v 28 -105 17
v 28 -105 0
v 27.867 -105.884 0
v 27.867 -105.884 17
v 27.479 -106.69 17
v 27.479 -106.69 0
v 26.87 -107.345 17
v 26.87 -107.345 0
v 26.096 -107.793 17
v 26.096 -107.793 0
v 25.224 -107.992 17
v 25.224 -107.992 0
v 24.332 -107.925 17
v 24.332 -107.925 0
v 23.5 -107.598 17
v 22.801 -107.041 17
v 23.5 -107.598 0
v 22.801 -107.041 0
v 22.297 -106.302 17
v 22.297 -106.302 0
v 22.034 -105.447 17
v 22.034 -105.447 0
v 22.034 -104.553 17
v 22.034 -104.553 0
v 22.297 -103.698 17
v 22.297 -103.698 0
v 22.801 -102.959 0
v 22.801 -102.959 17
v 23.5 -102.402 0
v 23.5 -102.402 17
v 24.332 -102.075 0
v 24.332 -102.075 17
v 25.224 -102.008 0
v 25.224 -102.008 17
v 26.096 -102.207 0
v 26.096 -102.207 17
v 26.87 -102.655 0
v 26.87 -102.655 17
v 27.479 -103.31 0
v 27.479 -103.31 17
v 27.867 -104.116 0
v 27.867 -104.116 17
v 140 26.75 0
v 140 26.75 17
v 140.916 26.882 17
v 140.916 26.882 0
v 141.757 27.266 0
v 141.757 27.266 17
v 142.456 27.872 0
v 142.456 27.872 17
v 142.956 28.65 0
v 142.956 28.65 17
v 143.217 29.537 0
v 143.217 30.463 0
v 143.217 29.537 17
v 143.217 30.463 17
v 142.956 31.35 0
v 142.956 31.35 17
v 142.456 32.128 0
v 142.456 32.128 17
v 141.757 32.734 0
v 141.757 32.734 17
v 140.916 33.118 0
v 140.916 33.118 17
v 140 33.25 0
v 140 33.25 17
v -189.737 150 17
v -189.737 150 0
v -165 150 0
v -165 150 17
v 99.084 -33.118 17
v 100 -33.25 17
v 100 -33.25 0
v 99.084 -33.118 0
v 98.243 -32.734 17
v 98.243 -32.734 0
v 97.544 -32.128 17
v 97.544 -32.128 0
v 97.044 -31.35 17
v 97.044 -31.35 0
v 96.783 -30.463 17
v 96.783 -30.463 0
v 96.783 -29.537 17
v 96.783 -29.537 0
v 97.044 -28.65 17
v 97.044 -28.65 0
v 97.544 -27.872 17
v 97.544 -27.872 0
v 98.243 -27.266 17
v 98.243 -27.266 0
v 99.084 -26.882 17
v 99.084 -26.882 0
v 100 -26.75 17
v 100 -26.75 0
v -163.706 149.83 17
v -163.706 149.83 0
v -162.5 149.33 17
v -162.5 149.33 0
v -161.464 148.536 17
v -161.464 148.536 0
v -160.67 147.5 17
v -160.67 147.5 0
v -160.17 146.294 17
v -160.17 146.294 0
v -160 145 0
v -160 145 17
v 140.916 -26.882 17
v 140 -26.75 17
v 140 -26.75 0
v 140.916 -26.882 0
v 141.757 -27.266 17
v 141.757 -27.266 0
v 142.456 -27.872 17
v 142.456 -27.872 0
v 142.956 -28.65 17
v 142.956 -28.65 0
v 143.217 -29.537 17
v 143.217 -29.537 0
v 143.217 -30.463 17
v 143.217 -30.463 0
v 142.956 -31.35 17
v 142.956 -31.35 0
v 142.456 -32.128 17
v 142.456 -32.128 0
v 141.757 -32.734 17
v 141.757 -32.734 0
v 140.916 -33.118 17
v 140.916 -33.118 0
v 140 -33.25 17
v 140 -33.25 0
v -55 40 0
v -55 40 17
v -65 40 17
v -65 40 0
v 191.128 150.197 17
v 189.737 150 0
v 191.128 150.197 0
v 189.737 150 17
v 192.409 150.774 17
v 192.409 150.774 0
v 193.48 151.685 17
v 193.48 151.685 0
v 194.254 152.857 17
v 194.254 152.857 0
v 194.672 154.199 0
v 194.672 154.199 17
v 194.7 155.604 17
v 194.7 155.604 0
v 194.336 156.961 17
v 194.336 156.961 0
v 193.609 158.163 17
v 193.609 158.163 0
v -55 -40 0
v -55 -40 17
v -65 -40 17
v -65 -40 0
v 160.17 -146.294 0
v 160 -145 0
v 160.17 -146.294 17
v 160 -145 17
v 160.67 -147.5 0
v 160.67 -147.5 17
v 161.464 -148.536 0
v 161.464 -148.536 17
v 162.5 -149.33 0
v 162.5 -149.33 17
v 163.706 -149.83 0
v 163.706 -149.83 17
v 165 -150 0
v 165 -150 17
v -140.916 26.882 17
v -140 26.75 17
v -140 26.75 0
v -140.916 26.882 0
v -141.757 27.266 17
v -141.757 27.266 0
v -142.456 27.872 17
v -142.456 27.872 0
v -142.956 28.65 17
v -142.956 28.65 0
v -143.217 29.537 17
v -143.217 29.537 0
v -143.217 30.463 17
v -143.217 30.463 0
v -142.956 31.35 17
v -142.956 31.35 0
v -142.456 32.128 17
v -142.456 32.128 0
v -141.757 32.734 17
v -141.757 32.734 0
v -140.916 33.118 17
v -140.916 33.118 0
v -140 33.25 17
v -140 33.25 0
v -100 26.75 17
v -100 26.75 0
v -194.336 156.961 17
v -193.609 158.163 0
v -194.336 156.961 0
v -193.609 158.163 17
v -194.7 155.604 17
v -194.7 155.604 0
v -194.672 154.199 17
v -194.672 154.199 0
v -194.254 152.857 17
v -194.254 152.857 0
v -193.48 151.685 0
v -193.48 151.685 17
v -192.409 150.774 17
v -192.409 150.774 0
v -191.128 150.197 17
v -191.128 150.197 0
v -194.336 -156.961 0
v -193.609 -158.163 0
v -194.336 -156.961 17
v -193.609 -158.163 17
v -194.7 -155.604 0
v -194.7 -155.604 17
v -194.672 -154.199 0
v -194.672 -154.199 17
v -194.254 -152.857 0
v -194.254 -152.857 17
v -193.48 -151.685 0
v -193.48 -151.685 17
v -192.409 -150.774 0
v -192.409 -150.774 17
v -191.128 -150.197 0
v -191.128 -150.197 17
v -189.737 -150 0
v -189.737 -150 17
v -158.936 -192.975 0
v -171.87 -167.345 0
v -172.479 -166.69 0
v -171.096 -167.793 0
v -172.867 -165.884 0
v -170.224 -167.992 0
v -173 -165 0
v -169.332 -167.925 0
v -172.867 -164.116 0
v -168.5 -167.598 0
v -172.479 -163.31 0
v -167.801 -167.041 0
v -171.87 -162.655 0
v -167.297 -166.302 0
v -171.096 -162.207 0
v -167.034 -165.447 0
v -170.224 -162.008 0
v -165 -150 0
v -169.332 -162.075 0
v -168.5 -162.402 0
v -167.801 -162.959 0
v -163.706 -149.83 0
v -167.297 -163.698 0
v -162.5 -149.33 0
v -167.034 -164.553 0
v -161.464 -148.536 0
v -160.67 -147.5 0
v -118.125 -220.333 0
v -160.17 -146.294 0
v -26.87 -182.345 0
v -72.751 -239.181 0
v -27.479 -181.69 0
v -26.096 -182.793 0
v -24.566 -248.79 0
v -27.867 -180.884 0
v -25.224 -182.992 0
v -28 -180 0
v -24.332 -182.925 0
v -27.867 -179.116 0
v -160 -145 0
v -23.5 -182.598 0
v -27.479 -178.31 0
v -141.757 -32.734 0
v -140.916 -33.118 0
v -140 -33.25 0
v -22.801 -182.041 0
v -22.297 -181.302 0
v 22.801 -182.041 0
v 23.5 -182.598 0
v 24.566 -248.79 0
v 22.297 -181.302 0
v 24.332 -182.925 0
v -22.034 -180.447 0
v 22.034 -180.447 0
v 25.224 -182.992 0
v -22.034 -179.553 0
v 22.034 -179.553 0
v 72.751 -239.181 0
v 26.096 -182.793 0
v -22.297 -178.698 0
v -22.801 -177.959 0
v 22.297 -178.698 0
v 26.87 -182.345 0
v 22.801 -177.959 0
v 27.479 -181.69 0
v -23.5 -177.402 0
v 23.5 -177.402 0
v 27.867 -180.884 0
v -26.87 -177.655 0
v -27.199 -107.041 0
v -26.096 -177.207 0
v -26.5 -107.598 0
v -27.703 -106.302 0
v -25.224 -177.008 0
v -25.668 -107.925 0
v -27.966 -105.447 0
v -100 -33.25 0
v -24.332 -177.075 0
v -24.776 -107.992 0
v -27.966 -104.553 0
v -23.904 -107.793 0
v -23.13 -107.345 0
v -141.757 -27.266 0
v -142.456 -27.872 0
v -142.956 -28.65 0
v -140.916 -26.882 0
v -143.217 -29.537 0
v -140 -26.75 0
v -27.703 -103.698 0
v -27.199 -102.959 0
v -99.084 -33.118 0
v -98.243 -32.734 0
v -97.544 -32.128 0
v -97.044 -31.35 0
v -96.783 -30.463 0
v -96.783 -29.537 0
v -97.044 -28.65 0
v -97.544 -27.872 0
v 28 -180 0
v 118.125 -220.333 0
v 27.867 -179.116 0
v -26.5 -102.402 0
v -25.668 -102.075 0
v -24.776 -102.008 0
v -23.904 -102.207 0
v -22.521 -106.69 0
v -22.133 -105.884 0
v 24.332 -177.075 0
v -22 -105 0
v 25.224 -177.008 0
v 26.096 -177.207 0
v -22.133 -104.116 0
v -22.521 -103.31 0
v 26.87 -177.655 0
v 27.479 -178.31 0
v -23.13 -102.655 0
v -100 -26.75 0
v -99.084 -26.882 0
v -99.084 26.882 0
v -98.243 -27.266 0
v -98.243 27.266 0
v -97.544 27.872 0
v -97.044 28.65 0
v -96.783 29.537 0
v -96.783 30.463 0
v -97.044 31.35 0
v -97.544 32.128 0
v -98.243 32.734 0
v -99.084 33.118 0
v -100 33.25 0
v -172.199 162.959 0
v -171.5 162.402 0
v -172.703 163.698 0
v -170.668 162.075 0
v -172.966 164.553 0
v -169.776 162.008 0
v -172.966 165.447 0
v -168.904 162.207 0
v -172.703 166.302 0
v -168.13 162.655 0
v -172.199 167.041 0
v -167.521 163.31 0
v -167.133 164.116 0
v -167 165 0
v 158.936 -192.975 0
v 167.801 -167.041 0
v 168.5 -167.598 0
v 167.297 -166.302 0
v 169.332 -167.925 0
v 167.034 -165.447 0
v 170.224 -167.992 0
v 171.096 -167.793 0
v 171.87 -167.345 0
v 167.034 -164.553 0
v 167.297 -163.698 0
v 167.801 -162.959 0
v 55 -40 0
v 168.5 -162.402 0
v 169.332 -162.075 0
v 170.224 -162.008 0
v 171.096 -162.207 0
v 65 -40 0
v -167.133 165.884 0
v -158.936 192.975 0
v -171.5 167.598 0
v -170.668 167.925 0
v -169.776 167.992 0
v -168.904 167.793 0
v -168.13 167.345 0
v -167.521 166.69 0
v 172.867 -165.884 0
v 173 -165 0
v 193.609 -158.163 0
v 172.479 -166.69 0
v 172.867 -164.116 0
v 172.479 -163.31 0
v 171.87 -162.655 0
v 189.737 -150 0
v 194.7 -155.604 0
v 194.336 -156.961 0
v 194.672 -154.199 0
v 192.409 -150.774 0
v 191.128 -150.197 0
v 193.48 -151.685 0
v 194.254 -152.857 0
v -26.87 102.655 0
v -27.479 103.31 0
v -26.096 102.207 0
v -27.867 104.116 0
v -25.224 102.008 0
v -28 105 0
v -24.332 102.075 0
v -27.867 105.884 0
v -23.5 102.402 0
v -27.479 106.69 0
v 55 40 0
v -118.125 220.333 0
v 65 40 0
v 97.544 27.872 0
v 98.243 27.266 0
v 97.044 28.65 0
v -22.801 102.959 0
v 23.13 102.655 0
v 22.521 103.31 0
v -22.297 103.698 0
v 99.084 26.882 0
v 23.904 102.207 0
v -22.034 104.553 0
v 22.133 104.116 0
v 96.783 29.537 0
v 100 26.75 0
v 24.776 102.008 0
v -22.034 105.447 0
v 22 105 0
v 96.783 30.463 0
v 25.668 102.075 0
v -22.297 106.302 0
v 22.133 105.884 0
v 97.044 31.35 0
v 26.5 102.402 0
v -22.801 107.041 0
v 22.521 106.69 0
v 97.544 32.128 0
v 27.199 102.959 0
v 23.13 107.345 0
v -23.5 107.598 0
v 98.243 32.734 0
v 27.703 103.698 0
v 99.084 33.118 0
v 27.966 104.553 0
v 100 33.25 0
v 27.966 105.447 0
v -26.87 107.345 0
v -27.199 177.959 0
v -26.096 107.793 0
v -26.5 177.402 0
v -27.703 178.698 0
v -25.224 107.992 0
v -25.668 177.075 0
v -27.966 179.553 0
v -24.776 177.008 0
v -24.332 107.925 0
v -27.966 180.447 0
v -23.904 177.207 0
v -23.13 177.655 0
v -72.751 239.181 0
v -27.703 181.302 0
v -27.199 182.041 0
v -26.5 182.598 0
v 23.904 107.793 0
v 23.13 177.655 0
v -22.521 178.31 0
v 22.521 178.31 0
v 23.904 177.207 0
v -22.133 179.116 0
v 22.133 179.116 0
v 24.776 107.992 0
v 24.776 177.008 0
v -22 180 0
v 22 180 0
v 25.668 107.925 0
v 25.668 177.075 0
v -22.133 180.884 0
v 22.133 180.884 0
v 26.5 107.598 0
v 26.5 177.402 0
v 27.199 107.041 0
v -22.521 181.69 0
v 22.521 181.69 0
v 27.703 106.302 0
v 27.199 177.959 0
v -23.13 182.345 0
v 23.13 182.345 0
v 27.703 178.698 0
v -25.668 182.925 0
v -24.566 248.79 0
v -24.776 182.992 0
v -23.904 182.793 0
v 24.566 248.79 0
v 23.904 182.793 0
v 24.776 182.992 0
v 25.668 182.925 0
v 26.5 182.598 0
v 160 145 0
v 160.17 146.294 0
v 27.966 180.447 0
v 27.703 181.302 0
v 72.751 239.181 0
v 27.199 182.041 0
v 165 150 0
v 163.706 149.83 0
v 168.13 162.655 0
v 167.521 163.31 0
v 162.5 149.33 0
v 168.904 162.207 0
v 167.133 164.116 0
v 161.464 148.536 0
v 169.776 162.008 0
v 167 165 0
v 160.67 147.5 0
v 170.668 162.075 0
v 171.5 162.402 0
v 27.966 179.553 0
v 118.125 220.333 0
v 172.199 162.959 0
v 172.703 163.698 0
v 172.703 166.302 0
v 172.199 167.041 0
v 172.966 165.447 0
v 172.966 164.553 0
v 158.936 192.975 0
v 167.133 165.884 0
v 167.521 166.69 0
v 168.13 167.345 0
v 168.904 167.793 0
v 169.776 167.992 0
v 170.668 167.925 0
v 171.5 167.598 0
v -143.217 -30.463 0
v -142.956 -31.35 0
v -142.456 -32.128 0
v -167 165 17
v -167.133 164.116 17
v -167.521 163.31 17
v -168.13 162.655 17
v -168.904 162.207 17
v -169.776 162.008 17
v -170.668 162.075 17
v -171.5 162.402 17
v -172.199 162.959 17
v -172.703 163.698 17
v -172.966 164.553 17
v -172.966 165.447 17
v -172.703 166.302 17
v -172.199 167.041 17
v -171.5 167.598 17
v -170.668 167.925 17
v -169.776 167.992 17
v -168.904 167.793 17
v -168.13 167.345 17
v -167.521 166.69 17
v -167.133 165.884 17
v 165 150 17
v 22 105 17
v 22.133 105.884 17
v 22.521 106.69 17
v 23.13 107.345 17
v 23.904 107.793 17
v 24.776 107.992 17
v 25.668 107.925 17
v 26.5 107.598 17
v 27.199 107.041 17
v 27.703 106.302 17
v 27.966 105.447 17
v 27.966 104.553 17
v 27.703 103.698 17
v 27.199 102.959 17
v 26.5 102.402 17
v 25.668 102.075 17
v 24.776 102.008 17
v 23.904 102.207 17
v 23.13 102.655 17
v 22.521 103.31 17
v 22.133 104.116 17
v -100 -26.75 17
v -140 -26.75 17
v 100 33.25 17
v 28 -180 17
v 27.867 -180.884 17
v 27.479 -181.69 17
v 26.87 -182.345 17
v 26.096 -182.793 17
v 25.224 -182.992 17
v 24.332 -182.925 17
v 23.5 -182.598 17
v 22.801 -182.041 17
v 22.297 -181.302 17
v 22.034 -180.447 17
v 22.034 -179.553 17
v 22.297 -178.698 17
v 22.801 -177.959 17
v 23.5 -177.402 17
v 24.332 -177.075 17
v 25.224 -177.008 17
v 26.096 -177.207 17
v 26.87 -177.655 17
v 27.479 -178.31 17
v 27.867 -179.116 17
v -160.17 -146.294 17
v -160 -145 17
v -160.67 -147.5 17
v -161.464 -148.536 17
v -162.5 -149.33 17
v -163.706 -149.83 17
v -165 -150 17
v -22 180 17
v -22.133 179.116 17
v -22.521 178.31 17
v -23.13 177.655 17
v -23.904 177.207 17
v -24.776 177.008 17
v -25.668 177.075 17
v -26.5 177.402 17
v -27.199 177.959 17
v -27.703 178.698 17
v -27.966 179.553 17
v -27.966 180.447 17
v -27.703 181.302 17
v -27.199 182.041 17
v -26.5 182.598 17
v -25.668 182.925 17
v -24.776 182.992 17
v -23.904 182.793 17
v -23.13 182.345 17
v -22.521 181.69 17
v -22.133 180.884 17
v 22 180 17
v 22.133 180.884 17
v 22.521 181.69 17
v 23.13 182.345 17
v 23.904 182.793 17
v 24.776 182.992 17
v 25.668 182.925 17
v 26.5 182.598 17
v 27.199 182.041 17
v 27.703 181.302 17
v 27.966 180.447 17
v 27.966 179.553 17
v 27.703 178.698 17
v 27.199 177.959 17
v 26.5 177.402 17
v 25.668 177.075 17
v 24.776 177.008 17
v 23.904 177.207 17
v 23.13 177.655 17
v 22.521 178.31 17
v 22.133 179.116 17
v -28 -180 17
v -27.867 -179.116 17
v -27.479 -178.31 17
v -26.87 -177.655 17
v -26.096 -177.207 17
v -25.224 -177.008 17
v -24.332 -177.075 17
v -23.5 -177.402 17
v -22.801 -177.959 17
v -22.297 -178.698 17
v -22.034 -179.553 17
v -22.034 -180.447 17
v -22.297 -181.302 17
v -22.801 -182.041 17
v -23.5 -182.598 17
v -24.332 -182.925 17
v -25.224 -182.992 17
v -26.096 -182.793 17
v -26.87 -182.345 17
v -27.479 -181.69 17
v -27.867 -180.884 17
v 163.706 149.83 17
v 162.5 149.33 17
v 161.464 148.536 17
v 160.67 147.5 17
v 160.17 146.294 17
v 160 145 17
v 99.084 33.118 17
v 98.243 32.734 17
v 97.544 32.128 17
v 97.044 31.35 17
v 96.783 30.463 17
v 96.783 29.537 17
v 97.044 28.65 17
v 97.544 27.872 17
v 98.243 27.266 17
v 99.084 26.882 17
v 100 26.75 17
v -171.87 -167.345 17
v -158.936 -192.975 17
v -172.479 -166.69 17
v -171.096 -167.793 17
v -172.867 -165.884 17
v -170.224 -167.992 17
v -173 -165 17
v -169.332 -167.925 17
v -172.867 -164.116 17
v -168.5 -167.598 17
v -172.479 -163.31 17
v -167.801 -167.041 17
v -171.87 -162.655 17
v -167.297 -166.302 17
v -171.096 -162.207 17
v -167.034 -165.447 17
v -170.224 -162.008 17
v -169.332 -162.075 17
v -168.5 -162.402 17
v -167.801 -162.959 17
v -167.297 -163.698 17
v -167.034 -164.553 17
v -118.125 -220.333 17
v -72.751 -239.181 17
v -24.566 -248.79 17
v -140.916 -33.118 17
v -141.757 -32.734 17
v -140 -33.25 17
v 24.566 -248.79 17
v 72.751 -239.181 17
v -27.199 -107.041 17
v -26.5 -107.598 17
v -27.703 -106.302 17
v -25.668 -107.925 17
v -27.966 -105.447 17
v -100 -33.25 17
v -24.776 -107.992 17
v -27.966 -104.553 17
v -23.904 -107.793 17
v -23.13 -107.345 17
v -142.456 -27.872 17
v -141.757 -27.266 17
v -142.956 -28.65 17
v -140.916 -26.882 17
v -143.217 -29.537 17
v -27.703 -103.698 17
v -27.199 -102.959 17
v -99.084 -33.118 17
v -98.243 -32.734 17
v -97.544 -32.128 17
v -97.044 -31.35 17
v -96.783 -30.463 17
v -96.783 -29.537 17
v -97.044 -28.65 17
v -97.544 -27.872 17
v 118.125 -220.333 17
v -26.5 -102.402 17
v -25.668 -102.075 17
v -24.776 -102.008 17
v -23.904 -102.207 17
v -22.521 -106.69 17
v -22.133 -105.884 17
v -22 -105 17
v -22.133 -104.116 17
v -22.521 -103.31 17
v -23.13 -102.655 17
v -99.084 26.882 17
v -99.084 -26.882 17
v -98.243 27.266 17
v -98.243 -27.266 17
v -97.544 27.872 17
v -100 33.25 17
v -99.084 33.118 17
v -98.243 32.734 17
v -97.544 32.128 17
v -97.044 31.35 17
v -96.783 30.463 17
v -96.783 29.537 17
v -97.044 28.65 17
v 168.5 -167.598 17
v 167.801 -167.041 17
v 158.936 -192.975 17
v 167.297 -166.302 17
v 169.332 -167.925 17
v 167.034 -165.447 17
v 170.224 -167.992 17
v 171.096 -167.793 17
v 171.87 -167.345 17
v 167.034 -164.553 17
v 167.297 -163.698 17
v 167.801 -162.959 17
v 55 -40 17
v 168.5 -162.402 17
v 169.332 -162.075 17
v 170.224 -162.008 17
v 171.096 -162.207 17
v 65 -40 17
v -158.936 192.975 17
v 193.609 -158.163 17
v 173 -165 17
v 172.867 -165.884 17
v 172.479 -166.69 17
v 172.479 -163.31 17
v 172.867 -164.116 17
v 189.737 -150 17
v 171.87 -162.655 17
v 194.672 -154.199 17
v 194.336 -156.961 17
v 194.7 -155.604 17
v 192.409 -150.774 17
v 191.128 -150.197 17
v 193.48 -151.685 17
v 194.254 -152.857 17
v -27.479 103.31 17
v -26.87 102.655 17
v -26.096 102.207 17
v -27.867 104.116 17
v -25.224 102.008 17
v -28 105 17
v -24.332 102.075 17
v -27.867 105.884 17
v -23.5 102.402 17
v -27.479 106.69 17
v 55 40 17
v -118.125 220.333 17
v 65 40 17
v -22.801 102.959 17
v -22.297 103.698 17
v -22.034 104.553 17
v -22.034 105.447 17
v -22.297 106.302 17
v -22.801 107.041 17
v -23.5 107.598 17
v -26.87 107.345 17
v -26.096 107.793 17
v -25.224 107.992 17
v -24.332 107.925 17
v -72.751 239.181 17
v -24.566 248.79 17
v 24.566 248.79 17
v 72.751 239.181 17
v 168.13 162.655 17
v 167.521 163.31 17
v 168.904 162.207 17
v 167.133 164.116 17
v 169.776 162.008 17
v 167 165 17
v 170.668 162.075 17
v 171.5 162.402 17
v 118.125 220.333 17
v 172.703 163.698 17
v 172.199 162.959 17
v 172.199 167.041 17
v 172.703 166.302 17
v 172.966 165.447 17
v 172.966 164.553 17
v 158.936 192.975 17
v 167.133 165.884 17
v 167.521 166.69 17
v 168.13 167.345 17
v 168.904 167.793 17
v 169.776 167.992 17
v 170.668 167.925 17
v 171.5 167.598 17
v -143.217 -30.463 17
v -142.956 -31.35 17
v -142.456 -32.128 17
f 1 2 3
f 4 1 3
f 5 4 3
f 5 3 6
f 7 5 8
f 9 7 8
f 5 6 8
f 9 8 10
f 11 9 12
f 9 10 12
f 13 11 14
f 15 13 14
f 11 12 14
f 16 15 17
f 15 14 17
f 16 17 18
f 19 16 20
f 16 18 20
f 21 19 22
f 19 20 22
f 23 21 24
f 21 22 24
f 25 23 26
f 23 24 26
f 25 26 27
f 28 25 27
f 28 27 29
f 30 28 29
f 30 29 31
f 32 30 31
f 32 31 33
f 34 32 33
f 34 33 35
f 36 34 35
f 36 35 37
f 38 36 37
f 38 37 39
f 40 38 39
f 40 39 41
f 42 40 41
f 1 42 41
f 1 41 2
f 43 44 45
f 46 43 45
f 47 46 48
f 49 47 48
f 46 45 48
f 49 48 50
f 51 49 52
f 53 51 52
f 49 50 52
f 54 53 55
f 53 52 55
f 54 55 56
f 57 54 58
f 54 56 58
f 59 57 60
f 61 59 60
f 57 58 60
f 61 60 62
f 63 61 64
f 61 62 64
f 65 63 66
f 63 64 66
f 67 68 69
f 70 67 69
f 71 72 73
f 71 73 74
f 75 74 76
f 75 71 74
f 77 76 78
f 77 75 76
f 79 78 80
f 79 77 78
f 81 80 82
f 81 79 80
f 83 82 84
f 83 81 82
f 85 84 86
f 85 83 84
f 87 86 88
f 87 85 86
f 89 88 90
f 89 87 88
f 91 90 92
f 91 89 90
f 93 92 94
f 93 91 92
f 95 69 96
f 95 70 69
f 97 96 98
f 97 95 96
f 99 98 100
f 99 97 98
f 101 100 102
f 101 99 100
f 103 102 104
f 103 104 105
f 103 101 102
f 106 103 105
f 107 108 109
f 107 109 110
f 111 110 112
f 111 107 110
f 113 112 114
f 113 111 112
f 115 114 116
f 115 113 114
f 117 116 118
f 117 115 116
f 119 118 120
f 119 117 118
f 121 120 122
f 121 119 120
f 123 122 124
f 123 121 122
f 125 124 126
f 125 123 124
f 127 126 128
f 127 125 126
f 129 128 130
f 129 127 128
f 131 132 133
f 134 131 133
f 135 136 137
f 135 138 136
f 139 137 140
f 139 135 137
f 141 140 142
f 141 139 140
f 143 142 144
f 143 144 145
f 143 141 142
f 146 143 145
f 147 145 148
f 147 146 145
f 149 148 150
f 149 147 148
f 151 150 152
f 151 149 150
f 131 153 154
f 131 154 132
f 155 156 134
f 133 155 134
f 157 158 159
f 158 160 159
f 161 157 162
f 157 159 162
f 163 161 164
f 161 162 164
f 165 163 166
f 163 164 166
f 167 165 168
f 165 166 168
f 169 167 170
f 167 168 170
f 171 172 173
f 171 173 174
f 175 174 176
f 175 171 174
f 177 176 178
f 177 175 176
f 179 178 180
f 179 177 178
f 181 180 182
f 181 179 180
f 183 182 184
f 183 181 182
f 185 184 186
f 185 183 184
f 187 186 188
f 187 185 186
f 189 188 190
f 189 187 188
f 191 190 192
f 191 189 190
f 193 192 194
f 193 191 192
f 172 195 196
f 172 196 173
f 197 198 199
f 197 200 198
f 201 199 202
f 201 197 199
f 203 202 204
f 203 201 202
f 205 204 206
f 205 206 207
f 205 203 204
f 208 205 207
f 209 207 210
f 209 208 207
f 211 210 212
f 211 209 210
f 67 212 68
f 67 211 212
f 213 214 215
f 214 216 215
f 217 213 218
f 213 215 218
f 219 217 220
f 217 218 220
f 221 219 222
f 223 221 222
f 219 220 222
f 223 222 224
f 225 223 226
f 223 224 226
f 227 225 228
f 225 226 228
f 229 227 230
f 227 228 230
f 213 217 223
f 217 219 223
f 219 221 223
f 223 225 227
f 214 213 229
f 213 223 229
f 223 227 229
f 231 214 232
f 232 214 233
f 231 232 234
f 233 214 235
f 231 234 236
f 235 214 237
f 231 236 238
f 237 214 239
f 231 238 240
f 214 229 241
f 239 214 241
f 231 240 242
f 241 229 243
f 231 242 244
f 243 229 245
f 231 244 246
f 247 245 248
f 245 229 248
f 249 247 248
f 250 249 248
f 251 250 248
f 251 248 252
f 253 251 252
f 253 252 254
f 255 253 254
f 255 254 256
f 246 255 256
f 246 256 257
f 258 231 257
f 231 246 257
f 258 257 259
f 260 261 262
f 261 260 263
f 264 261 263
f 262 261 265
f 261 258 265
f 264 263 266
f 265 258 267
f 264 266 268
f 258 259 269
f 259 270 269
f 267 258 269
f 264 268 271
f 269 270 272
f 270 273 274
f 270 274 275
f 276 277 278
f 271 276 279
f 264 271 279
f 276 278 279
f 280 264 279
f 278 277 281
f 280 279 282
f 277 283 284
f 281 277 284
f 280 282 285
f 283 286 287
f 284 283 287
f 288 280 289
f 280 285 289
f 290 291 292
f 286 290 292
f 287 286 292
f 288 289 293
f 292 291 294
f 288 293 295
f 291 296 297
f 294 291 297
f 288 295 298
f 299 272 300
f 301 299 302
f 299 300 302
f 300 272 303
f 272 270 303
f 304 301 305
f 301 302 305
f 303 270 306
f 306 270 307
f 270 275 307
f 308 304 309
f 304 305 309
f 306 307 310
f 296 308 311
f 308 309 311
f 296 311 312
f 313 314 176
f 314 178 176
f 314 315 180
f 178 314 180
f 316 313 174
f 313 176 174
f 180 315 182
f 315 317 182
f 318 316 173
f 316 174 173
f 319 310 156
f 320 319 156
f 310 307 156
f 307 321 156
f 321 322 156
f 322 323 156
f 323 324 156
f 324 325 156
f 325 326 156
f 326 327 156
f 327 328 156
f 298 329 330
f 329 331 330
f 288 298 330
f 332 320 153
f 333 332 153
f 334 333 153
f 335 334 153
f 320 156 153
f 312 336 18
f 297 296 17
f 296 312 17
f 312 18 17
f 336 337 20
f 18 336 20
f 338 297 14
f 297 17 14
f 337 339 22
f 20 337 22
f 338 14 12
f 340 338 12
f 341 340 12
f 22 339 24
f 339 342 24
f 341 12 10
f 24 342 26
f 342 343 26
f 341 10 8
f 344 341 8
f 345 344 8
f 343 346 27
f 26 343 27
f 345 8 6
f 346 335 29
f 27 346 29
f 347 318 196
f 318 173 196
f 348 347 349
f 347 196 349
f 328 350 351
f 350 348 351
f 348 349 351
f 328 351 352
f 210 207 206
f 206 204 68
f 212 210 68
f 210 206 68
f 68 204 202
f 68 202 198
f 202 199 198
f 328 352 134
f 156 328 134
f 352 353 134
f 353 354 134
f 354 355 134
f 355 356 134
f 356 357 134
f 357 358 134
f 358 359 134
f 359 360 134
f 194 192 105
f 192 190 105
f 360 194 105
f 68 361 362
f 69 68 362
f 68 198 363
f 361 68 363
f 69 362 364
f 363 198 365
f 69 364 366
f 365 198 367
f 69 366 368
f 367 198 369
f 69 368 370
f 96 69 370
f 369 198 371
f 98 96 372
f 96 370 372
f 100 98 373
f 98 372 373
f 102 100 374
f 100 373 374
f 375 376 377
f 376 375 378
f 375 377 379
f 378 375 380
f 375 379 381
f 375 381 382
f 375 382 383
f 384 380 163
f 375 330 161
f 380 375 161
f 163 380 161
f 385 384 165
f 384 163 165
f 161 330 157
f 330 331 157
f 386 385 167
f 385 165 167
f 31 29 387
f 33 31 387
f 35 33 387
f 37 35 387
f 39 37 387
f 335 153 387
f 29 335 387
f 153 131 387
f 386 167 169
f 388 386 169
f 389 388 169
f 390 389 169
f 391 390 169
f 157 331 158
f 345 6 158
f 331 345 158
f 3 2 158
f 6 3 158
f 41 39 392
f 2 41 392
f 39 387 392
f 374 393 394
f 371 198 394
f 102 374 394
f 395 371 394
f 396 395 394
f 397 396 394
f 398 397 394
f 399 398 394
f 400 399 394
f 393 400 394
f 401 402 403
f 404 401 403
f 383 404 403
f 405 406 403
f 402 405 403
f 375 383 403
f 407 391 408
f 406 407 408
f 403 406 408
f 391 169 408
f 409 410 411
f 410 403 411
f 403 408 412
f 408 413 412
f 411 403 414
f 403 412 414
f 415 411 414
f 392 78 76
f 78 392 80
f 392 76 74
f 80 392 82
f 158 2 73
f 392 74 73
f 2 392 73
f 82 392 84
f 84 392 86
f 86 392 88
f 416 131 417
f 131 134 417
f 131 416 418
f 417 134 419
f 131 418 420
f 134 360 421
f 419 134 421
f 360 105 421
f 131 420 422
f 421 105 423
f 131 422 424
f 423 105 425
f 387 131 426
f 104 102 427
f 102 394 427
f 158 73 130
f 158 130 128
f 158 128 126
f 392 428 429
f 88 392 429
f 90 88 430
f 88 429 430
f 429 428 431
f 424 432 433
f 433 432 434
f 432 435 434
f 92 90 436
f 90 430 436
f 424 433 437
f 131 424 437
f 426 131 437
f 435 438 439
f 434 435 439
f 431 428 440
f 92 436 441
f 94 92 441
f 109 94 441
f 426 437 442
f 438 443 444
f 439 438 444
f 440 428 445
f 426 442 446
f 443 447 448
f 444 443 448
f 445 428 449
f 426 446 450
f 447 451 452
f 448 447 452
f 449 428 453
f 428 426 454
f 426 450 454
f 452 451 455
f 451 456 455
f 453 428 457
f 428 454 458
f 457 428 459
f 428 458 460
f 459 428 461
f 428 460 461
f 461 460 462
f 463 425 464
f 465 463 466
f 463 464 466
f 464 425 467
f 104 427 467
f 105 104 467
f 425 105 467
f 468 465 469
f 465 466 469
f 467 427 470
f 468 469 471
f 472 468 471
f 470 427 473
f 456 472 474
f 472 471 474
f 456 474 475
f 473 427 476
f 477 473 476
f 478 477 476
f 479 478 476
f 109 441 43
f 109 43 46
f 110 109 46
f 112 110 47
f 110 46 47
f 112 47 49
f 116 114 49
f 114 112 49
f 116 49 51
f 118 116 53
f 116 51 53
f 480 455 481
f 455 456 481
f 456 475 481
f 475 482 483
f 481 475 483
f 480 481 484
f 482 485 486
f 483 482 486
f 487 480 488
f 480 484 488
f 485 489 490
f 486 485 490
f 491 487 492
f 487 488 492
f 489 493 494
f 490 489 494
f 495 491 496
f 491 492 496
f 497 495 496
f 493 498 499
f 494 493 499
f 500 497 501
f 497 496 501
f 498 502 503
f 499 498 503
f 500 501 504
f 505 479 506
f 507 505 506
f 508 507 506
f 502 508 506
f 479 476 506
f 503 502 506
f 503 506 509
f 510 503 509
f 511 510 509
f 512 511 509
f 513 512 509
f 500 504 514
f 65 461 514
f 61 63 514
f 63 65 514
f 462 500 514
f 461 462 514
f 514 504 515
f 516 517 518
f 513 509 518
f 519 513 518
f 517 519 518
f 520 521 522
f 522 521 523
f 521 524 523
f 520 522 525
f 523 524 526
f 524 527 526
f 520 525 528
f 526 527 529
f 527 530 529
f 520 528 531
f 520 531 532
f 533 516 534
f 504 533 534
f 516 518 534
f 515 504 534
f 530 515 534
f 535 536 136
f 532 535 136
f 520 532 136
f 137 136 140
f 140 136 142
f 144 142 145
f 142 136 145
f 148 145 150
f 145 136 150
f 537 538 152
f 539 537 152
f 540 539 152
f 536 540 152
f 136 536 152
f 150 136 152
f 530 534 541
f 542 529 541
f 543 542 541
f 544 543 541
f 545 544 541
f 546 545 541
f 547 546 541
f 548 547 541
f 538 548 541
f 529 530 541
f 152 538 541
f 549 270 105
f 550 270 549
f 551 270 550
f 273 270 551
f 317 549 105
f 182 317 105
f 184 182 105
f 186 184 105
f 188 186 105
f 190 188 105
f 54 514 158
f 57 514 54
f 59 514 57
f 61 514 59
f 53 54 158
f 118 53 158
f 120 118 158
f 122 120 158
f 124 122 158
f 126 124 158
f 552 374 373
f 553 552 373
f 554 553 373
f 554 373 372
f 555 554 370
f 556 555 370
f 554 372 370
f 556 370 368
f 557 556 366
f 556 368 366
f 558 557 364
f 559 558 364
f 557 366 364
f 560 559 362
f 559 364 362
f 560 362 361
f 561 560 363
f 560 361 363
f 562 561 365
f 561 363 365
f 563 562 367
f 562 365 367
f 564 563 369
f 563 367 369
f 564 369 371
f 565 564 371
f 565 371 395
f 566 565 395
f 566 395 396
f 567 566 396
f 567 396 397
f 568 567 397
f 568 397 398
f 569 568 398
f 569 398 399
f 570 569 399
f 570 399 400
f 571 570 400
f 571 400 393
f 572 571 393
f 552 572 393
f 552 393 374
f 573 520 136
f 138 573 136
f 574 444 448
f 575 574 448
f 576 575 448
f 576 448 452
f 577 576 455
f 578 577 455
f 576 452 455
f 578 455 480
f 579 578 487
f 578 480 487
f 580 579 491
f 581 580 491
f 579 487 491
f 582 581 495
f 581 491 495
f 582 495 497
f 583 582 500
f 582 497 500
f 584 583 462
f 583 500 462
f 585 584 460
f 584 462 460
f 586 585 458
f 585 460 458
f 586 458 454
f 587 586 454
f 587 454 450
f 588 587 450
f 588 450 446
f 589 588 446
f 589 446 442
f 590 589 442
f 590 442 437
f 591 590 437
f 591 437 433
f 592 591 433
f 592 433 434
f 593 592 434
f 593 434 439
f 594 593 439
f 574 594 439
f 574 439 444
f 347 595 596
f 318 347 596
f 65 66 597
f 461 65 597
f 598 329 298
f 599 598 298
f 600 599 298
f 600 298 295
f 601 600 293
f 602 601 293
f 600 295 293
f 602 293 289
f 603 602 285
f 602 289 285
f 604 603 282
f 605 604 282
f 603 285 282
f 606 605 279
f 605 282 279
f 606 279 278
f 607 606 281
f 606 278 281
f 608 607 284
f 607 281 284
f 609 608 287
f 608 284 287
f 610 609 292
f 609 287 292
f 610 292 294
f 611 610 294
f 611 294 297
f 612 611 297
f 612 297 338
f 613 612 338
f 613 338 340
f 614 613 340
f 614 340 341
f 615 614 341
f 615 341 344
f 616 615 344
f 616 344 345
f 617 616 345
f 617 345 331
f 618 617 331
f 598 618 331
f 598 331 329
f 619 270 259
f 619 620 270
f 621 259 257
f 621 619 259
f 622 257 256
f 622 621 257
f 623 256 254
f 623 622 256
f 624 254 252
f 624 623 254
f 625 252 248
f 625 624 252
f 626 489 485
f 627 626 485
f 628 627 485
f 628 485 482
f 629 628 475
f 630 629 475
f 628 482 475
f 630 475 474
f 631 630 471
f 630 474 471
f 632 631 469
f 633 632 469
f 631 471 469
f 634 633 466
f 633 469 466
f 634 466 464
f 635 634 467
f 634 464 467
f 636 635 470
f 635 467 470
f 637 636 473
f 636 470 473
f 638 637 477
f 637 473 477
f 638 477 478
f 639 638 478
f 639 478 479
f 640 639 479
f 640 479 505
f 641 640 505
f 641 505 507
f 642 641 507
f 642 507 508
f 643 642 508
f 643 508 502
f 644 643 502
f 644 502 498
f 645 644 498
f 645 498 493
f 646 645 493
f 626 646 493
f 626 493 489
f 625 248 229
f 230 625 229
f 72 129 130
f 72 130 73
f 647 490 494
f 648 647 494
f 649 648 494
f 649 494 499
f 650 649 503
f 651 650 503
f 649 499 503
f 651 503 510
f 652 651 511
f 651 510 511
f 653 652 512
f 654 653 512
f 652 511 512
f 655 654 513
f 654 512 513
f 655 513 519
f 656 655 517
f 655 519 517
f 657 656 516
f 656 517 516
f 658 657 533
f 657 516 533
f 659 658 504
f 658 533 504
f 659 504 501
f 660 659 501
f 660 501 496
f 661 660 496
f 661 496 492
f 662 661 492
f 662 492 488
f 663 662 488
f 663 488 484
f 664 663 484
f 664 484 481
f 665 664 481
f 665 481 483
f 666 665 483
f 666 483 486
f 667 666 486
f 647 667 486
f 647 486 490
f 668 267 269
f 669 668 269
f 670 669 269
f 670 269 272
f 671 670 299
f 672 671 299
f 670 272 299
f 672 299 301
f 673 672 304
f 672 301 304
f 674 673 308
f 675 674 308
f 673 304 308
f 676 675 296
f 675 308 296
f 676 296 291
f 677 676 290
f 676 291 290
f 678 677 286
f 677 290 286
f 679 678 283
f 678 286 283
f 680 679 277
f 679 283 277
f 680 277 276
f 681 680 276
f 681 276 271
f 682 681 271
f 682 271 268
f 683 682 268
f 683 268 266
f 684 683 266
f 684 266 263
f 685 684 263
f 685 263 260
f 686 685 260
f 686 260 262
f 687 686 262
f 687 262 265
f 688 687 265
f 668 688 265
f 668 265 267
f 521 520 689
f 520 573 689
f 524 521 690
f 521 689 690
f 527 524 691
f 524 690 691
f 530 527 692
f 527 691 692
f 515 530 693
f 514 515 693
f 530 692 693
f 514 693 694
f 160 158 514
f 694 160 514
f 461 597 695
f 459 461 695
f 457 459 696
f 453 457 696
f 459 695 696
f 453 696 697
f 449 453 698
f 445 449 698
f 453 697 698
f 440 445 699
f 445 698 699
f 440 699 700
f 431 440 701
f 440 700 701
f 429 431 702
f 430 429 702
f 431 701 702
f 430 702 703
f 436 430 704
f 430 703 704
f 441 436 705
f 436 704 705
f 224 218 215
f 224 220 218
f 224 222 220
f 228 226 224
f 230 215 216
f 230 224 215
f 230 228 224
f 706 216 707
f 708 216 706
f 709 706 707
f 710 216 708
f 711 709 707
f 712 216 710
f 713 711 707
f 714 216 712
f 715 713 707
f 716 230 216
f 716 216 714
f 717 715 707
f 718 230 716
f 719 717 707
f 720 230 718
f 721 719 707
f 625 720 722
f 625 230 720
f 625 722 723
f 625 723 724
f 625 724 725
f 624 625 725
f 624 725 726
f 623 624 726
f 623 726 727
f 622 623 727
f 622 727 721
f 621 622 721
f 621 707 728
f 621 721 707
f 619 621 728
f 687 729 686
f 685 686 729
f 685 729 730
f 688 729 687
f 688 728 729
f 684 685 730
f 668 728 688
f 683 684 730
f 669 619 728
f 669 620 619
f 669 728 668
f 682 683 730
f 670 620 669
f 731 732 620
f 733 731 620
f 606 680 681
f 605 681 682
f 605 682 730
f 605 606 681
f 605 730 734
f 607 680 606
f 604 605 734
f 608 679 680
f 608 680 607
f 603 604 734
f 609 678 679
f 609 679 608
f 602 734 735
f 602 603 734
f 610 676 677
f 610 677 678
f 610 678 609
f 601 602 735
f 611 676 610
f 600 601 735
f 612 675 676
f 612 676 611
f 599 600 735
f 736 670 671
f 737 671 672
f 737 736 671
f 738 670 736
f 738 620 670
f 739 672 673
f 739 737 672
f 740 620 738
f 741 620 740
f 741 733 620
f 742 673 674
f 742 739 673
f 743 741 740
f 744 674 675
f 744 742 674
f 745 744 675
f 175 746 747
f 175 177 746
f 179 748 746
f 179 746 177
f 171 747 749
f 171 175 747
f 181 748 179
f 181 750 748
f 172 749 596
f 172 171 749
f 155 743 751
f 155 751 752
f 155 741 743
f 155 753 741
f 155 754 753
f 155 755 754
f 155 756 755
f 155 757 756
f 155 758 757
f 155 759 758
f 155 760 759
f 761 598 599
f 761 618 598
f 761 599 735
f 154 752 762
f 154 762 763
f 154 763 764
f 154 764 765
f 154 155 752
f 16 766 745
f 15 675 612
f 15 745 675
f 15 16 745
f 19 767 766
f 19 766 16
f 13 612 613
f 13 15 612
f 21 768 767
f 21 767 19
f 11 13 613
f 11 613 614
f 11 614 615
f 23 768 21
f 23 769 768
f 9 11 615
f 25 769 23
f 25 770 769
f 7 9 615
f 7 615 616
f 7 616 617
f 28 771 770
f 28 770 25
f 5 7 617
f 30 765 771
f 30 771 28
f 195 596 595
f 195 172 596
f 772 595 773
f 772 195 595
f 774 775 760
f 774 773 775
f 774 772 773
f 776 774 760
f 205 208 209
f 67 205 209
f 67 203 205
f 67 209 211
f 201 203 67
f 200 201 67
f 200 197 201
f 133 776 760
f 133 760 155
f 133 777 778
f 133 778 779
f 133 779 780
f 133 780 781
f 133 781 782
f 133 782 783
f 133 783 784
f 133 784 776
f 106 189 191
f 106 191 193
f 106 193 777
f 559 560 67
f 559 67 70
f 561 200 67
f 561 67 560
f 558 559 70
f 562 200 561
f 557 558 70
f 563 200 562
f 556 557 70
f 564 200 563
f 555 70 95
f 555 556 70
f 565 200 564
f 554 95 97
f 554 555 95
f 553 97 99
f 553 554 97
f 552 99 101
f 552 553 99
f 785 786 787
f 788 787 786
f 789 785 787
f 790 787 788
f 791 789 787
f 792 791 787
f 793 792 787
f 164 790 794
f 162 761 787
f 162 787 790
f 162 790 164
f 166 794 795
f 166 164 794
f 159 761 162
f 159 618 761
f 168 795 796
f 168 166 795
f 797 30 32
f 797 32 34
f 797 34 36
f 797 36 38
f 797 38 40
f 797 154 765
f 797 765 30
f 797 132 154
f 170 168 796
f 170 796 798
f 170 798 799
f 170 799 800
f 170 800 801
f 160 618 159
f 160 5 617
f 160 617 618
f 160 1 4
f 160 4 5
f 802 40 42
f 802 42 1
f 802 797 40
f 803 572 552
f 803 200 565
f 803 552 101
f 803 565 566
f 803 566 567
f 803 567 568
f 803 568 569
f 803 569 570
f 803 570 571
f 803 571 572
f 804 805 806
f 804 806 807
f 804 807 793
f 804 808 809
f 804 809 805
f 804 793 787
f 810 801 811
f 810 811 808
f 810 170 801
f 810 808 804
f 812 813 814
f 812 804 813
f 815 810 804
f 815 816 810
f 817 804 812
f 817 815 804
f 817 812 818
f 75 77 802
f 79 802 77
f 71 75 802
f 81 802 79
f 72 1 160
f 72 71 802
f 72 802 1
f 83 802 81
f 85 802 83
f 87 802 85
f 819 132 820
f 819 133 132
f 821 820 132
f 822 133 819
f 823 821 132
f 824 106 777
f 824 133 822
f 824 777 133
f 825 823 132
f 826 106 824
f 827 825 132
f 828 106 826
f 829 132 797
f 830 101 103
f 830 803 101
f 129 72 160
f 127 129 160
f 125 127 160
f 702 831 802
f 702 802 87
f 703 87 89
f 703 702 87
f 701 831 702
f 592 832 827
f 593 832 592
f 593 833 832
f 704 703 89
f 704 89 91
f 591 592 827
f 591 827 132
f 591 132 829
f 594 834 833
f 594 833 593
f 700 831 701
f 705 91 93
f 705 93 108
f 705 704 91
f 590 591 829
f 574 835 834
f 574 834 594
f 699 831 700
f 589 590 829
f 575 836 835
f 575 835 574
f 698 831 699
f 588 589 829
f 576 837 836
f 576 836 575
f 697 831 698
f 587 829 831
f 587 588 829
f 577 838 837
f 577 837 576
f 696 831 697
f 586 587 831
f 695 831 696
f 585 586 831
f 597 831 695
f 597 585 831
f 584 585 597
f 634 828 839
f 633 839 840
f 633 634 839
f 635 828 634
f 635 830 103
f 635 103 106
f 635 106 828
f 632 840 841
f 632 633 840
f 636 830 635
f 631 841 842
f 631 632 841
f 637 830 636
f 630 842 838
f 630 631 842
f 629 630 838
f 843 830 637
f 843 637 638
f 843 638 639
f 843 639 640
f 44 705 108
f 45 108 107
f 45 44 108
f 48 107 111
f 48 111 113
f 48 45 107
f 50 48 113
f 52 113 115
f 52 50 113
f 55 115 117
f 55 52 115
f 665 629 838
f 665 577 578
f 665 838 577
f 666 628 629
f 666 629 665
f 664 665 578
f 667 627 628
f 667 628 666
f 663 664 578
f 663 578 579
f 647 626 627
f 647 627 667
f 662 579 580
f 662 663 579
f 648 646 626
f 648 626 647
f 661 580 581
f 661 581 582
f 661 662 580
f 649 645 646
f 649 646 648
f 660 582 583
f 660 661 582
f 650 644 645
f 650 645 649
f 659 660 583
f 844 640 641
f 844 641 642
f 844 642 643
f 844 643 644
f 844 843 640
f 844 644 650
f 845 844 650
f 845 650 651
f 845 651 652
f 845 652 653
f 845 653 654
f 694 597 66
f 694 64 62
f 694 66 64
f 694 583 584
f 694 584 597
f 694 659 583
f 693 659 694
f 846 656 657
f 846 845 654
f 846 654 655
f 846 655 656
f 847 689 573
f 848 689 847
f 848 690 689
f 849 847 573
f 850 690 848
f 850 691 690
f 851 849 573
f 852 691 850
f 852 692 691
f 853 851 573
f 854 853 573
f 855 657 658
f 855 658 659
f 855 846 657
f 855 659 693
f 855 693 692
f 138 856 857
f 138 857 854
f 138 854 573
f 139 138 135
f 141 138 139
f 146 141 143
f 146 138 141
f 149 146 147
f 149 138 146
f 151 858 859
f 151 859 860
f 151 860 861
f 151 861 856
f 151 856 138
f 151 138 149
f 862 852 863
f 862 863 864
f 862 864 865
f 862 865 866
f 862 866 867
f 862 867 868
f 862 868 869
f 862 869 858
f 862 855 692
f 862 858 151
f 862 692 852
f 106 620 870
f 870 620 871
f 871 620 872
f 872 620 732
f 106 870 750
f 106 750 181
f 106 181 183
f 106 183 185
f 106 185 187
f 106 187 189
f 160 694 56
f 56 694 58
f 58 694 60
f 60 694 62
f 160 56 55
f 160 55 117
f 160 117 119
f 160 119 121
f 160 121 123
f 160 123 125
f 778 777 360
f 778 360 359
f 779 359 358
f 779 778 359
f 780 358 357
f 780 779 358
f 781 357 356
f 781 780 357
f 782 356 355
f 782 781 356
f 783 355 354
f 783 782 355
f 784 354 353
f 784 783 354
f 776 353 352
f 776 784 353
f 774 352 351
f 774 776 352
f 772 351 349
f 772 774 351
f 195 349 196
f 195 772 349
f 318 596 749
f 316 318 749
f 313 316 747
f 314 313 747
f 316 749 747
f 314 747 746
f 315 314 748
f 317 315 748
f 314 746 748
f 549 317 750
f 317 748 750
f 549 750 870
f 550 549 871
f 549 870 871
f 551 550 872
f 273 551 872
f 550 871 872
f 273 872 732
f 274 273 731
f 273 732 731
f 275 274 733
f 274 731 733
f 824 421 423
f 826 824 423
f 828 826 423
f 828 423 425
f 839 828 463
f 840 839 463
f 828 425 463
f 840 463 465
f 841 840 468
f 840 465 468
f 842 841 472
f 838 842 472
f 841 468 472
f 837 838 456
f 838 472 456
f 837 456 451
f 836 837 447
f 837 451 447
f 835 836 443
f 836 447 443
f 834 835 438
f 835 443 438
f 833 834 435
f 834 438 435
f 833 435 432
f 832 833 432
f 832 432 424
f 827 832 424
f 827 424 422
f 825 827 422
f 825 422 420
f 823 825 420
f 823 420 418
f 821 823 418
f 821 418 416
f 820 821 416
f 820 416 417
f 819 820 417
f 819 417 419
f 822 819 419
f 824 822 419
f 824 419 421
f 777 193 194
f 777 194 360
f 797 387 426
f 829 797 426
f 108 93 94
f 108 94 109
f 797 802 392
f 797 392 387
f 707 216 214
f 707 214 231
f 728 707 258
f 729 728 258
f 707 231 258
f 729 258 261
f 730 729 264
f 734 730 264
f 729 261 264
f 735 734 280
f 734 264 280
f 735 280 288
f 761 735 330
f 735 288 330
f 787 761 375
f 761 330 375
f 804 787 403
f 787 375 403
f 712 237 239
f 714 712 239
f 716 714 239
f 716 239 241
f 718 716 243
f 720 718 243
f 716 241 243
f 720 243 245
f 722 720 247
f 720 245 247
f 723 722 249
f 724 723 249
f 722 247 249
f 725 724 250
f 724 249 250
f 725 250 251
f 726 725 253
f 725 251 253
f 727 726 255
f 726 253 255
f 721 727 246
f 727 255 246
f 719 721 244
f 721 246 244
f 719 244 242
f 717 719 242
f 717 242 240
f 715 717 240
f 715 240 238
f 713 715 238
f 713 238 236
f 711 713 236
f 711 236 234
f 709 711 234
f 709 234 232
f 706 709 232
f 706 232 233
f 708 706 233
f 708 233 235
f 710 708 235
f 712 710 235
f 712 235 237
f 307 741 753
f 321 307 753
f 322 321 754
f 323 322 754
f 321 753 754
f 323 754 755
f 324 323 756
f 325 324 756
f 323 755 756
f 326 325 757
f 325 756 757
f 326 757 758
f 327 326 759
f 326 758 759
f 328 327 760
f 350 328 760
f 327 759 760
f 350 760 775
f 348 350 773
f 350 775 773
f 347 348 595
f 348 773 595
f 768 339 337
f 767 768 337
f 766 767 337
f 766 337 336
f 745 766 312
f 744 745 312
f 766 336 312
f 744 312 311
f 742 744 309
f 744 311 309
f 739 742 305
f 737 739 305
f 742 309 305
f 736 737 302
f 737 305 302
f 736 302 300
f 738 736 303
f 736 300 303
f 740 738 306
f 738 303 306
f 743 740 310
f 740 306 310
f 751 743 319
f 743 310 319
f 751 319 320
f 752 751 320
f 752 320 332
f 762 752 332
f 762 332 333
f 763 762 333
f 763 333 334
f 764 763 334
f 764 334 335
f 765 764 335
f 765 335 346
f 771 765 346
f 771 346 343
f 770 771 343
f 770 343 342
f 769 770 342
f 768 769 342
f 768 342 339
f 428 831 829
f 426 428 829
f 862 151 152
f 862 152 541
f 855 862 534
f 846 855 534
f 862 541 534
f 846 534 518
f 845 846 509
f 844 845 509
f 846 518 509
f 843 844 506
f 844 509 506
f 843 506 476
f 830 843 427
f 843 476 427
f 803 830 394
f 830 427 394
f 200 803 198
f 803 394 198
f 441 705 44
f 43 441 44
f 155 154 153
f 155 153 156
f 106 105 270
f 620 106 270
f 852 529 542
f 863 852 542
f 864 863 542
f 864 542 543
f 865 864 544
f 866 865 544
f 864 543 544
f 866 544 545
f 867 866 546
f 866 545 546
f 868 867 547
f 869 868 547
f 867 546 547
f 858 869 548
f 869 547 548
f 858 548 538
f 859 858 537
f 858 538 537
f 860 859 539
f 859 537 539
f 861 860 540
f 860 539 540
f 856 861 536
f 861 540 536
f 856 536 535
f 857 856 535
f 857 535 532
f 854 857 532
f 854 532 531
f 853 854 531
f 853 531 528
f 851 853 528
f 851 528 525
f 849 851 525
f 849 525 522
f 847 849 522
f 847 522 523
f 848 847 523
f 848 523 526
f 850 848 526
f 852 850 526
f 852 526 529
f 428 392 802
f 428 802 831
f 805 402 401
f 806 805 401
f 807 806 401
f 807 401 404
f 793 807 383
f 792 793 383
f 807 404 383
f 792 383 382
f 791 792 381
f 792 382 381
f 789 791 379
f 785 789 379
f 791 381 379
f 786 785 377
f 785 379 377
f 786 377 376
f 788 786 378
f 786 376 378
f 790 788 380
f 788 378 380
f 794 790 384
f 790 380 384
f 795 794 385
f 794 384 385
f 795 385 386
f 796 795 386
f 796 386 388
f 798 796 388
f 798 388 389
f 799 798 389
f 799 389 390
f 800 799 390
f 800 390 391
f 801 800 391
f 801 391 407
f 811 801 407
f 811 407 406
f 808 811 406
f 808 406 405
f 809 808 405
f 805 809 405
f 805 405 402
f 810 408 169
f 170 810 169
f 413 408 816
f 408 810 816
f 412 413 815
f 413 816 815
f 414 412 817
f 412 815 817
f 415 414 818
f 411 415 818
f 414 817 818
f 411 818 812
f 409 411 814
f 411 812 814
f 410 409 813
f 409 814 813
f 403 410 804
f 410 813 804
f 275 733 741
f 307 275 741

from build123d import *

# Parameters (mm, degrees)
ESTRUSIONE_ESTRUSIONE1_DEPTH = 17
TAGLIO_ESTRUSIONE1_DEPTH     = 321.60723635
RACCORDO1_R                  = 5
SCHIZZO3_R                   = 3
TAGLIO_ESTRUSIONE2_DEPTH     = 318.350542139
SCHIZZO4_W                   = 10
SCHIZZO4_H                   = 80
TAGLIO_ESTRUSIONE4_DEPTH     = 318.350542139
SCHIZZO5_R                   = 3
TAGLIO_ESTRUSIONE5_DEPTH     = 318.350542139


with BuildPart() as part:
    # Schizzo1 → Estrusione-Estrusione1 (new body)
    with BuildSketch(Plane.XY):
        with BuildLine():
            Line((160, 150), (200, 150))
            ThreePointArc((200, 150), (0, 250), (-200, 150))
            Line((-200, 150), (-160, 150))
            Line((-160, 150), (-160, -150))
            Line((-160, -150), (-200, -150))
            ThreePointArc((-200, -150), (0, -250), (200, -150))
            Line((200, -150), (160, -150))
            Line((160, -150), (160, 150))
        make_face()
    extrude(amount=ESTRUSIONE_ESTRUSIONE1_DEPTH)

    # Schizzo2 → Taglio-Estrusione1 (cut, through all)
    with BuildSketch(Plane.XY.offset(17)):
        with BuildLine():
            Line((-140, 33.25), (-100, 33.25))
            ThreePointArc((-100, 33.25), (-96.75, 30), (-100, 26.75))
            Line((-100, 26.75), (-140, 26.75))
            ThreePointArc((-140, 26.75), (-143.25, 30), (-140, 33.25))
        make_face()
        with BuildLine():
            Line((-140, -33.25), (-100, -33.25))
            ThreePointArc((-100, -33.25), (-96.75, -30), (-100, -26.75))
            Line((-100, -26.75), (-140, -26.75))
            ThreePointArc((-140, -26.75), (-143.25, -30), (-140, -33.25))
        make_face()
        with BuildLine():
            Line((140, -33.25), (100, -33.25))
            ThreePointArc((100, -33.25), (96.75, -30), (100, -26.75))
            Line((100, -26.75), (140, -26.75))
            ThreePointArc((140, -26.75), (143.25, -30), (140, -33.25))
        make_face()
        with BuildLine():
            Line((140, 33.25), (100, 33.25))
            ThreePointArc((100, 33.25), (96.75, 30), (100, 26.75))
            Line((100, 26.75), (140, 26.75))
            ThreePointArc((140, 26.75), (143.25, 30), (140, 33.25))
        make_face()
    extrude(amount=-TAGLIO_ESTRUSIONE1_DEPTH, mode=Mode.SUBTRACT)

    # Raccordo1
    raccordo1_edges = [part.edges().sort_by_distance(p)[0] for p in [
        (160, 150, 8.5),
        (160, -150, 8.5),
        (200, -150, 8.5),
        (-200, -150, 8.5),
        (-160, -150, 8.5),
        (-160, 150, 8.5),
        (-200, 150, 8.5),
        (200, 150, 8.5),
    ]]
    fillet(raccordo1_edges, radius=RACCORDO1_R)

    # Schizzo3 → Taglio-Estrusione2 (cut, through all)
    with BuildSketch(Plane(origin=(0, 0, 0), x_dir=(-1, 0, 0), z_dir=(0, 0, -1))):
        with Locations((-25, 180)):
            Circle(SCHIZZO3_R)
        with Locations(Location((25, 180, 0), (0, 0, 180))):
            Circle(SCHIZZO3_R)
        with Locations((-25, 105)):
            Circle(SCHIZZO3_R)
        with Locations((25, 105)):
            Circle(SCHIZZO3_R)
        with Locations(Location((-25, -105, 0), (0, 0, 180))):
            Circle(SCHIZZO3_R)
        with Locations(Location((25, -105, 0), (0, 0, 180))):
            Circle(SCHIZZO3_R)
        with Locations((25, -180)):
            Circle(SCHIZZO3_R)
        with Locations(Location((-25, -180, 0), (0, 0, 180))):
            Circle(SCHIZZO3_R)
    extrude(amount=-TAGLIO_ESTRUSIONE2_DEPTH, mode=Mode.SUBTRACT)

    # Schizzo4 → Taglio-Estrusione4 (cut, through all)
    with BuildSketch(Plane(origin=(0, 0, 0), x_dir=(-1, 0, 0), z_dir=(0, 0, -1))):
        with Locations((-60, 0)):
            Rectangle(SCHIZZO4_W, SCHIZZO4_H)
        with Locations((60, 0)):
            Rectangle(SCHIZZO4_W, SCHIZZO4_H)
    extrude(amount=-TAGLIO_ESTRUSIONE4_DEPTH, mode=Mode.SUBTRACT)

    # Schizzo5 → Taglio-Estrusione5 (cut, through all)
    with BuildSketch(Plane(origin=(0, 0, 0), x_dir=(-1, 0, 0), z_dir=(0, 0, -1))):
        with Locations((-170, 165)):
            Circle(SCHIZZO5_R)
        with Locations(Location((170, 165, 0), (0, 0, 180))):
            Circle(SCHIZZO5_R)
        with Locations((170, -165)):
            Circle(SCHIZZO5_R)
        with Locations(Location((-170, -165, 0), (0, 0, 180))):
            Circle(SCHIZZO5_R)
    extrude(amount=-TAGLIO_ESTRUSIONE5_DEPTH, mode=Mode.SUBTRACT)


solid = part.part
